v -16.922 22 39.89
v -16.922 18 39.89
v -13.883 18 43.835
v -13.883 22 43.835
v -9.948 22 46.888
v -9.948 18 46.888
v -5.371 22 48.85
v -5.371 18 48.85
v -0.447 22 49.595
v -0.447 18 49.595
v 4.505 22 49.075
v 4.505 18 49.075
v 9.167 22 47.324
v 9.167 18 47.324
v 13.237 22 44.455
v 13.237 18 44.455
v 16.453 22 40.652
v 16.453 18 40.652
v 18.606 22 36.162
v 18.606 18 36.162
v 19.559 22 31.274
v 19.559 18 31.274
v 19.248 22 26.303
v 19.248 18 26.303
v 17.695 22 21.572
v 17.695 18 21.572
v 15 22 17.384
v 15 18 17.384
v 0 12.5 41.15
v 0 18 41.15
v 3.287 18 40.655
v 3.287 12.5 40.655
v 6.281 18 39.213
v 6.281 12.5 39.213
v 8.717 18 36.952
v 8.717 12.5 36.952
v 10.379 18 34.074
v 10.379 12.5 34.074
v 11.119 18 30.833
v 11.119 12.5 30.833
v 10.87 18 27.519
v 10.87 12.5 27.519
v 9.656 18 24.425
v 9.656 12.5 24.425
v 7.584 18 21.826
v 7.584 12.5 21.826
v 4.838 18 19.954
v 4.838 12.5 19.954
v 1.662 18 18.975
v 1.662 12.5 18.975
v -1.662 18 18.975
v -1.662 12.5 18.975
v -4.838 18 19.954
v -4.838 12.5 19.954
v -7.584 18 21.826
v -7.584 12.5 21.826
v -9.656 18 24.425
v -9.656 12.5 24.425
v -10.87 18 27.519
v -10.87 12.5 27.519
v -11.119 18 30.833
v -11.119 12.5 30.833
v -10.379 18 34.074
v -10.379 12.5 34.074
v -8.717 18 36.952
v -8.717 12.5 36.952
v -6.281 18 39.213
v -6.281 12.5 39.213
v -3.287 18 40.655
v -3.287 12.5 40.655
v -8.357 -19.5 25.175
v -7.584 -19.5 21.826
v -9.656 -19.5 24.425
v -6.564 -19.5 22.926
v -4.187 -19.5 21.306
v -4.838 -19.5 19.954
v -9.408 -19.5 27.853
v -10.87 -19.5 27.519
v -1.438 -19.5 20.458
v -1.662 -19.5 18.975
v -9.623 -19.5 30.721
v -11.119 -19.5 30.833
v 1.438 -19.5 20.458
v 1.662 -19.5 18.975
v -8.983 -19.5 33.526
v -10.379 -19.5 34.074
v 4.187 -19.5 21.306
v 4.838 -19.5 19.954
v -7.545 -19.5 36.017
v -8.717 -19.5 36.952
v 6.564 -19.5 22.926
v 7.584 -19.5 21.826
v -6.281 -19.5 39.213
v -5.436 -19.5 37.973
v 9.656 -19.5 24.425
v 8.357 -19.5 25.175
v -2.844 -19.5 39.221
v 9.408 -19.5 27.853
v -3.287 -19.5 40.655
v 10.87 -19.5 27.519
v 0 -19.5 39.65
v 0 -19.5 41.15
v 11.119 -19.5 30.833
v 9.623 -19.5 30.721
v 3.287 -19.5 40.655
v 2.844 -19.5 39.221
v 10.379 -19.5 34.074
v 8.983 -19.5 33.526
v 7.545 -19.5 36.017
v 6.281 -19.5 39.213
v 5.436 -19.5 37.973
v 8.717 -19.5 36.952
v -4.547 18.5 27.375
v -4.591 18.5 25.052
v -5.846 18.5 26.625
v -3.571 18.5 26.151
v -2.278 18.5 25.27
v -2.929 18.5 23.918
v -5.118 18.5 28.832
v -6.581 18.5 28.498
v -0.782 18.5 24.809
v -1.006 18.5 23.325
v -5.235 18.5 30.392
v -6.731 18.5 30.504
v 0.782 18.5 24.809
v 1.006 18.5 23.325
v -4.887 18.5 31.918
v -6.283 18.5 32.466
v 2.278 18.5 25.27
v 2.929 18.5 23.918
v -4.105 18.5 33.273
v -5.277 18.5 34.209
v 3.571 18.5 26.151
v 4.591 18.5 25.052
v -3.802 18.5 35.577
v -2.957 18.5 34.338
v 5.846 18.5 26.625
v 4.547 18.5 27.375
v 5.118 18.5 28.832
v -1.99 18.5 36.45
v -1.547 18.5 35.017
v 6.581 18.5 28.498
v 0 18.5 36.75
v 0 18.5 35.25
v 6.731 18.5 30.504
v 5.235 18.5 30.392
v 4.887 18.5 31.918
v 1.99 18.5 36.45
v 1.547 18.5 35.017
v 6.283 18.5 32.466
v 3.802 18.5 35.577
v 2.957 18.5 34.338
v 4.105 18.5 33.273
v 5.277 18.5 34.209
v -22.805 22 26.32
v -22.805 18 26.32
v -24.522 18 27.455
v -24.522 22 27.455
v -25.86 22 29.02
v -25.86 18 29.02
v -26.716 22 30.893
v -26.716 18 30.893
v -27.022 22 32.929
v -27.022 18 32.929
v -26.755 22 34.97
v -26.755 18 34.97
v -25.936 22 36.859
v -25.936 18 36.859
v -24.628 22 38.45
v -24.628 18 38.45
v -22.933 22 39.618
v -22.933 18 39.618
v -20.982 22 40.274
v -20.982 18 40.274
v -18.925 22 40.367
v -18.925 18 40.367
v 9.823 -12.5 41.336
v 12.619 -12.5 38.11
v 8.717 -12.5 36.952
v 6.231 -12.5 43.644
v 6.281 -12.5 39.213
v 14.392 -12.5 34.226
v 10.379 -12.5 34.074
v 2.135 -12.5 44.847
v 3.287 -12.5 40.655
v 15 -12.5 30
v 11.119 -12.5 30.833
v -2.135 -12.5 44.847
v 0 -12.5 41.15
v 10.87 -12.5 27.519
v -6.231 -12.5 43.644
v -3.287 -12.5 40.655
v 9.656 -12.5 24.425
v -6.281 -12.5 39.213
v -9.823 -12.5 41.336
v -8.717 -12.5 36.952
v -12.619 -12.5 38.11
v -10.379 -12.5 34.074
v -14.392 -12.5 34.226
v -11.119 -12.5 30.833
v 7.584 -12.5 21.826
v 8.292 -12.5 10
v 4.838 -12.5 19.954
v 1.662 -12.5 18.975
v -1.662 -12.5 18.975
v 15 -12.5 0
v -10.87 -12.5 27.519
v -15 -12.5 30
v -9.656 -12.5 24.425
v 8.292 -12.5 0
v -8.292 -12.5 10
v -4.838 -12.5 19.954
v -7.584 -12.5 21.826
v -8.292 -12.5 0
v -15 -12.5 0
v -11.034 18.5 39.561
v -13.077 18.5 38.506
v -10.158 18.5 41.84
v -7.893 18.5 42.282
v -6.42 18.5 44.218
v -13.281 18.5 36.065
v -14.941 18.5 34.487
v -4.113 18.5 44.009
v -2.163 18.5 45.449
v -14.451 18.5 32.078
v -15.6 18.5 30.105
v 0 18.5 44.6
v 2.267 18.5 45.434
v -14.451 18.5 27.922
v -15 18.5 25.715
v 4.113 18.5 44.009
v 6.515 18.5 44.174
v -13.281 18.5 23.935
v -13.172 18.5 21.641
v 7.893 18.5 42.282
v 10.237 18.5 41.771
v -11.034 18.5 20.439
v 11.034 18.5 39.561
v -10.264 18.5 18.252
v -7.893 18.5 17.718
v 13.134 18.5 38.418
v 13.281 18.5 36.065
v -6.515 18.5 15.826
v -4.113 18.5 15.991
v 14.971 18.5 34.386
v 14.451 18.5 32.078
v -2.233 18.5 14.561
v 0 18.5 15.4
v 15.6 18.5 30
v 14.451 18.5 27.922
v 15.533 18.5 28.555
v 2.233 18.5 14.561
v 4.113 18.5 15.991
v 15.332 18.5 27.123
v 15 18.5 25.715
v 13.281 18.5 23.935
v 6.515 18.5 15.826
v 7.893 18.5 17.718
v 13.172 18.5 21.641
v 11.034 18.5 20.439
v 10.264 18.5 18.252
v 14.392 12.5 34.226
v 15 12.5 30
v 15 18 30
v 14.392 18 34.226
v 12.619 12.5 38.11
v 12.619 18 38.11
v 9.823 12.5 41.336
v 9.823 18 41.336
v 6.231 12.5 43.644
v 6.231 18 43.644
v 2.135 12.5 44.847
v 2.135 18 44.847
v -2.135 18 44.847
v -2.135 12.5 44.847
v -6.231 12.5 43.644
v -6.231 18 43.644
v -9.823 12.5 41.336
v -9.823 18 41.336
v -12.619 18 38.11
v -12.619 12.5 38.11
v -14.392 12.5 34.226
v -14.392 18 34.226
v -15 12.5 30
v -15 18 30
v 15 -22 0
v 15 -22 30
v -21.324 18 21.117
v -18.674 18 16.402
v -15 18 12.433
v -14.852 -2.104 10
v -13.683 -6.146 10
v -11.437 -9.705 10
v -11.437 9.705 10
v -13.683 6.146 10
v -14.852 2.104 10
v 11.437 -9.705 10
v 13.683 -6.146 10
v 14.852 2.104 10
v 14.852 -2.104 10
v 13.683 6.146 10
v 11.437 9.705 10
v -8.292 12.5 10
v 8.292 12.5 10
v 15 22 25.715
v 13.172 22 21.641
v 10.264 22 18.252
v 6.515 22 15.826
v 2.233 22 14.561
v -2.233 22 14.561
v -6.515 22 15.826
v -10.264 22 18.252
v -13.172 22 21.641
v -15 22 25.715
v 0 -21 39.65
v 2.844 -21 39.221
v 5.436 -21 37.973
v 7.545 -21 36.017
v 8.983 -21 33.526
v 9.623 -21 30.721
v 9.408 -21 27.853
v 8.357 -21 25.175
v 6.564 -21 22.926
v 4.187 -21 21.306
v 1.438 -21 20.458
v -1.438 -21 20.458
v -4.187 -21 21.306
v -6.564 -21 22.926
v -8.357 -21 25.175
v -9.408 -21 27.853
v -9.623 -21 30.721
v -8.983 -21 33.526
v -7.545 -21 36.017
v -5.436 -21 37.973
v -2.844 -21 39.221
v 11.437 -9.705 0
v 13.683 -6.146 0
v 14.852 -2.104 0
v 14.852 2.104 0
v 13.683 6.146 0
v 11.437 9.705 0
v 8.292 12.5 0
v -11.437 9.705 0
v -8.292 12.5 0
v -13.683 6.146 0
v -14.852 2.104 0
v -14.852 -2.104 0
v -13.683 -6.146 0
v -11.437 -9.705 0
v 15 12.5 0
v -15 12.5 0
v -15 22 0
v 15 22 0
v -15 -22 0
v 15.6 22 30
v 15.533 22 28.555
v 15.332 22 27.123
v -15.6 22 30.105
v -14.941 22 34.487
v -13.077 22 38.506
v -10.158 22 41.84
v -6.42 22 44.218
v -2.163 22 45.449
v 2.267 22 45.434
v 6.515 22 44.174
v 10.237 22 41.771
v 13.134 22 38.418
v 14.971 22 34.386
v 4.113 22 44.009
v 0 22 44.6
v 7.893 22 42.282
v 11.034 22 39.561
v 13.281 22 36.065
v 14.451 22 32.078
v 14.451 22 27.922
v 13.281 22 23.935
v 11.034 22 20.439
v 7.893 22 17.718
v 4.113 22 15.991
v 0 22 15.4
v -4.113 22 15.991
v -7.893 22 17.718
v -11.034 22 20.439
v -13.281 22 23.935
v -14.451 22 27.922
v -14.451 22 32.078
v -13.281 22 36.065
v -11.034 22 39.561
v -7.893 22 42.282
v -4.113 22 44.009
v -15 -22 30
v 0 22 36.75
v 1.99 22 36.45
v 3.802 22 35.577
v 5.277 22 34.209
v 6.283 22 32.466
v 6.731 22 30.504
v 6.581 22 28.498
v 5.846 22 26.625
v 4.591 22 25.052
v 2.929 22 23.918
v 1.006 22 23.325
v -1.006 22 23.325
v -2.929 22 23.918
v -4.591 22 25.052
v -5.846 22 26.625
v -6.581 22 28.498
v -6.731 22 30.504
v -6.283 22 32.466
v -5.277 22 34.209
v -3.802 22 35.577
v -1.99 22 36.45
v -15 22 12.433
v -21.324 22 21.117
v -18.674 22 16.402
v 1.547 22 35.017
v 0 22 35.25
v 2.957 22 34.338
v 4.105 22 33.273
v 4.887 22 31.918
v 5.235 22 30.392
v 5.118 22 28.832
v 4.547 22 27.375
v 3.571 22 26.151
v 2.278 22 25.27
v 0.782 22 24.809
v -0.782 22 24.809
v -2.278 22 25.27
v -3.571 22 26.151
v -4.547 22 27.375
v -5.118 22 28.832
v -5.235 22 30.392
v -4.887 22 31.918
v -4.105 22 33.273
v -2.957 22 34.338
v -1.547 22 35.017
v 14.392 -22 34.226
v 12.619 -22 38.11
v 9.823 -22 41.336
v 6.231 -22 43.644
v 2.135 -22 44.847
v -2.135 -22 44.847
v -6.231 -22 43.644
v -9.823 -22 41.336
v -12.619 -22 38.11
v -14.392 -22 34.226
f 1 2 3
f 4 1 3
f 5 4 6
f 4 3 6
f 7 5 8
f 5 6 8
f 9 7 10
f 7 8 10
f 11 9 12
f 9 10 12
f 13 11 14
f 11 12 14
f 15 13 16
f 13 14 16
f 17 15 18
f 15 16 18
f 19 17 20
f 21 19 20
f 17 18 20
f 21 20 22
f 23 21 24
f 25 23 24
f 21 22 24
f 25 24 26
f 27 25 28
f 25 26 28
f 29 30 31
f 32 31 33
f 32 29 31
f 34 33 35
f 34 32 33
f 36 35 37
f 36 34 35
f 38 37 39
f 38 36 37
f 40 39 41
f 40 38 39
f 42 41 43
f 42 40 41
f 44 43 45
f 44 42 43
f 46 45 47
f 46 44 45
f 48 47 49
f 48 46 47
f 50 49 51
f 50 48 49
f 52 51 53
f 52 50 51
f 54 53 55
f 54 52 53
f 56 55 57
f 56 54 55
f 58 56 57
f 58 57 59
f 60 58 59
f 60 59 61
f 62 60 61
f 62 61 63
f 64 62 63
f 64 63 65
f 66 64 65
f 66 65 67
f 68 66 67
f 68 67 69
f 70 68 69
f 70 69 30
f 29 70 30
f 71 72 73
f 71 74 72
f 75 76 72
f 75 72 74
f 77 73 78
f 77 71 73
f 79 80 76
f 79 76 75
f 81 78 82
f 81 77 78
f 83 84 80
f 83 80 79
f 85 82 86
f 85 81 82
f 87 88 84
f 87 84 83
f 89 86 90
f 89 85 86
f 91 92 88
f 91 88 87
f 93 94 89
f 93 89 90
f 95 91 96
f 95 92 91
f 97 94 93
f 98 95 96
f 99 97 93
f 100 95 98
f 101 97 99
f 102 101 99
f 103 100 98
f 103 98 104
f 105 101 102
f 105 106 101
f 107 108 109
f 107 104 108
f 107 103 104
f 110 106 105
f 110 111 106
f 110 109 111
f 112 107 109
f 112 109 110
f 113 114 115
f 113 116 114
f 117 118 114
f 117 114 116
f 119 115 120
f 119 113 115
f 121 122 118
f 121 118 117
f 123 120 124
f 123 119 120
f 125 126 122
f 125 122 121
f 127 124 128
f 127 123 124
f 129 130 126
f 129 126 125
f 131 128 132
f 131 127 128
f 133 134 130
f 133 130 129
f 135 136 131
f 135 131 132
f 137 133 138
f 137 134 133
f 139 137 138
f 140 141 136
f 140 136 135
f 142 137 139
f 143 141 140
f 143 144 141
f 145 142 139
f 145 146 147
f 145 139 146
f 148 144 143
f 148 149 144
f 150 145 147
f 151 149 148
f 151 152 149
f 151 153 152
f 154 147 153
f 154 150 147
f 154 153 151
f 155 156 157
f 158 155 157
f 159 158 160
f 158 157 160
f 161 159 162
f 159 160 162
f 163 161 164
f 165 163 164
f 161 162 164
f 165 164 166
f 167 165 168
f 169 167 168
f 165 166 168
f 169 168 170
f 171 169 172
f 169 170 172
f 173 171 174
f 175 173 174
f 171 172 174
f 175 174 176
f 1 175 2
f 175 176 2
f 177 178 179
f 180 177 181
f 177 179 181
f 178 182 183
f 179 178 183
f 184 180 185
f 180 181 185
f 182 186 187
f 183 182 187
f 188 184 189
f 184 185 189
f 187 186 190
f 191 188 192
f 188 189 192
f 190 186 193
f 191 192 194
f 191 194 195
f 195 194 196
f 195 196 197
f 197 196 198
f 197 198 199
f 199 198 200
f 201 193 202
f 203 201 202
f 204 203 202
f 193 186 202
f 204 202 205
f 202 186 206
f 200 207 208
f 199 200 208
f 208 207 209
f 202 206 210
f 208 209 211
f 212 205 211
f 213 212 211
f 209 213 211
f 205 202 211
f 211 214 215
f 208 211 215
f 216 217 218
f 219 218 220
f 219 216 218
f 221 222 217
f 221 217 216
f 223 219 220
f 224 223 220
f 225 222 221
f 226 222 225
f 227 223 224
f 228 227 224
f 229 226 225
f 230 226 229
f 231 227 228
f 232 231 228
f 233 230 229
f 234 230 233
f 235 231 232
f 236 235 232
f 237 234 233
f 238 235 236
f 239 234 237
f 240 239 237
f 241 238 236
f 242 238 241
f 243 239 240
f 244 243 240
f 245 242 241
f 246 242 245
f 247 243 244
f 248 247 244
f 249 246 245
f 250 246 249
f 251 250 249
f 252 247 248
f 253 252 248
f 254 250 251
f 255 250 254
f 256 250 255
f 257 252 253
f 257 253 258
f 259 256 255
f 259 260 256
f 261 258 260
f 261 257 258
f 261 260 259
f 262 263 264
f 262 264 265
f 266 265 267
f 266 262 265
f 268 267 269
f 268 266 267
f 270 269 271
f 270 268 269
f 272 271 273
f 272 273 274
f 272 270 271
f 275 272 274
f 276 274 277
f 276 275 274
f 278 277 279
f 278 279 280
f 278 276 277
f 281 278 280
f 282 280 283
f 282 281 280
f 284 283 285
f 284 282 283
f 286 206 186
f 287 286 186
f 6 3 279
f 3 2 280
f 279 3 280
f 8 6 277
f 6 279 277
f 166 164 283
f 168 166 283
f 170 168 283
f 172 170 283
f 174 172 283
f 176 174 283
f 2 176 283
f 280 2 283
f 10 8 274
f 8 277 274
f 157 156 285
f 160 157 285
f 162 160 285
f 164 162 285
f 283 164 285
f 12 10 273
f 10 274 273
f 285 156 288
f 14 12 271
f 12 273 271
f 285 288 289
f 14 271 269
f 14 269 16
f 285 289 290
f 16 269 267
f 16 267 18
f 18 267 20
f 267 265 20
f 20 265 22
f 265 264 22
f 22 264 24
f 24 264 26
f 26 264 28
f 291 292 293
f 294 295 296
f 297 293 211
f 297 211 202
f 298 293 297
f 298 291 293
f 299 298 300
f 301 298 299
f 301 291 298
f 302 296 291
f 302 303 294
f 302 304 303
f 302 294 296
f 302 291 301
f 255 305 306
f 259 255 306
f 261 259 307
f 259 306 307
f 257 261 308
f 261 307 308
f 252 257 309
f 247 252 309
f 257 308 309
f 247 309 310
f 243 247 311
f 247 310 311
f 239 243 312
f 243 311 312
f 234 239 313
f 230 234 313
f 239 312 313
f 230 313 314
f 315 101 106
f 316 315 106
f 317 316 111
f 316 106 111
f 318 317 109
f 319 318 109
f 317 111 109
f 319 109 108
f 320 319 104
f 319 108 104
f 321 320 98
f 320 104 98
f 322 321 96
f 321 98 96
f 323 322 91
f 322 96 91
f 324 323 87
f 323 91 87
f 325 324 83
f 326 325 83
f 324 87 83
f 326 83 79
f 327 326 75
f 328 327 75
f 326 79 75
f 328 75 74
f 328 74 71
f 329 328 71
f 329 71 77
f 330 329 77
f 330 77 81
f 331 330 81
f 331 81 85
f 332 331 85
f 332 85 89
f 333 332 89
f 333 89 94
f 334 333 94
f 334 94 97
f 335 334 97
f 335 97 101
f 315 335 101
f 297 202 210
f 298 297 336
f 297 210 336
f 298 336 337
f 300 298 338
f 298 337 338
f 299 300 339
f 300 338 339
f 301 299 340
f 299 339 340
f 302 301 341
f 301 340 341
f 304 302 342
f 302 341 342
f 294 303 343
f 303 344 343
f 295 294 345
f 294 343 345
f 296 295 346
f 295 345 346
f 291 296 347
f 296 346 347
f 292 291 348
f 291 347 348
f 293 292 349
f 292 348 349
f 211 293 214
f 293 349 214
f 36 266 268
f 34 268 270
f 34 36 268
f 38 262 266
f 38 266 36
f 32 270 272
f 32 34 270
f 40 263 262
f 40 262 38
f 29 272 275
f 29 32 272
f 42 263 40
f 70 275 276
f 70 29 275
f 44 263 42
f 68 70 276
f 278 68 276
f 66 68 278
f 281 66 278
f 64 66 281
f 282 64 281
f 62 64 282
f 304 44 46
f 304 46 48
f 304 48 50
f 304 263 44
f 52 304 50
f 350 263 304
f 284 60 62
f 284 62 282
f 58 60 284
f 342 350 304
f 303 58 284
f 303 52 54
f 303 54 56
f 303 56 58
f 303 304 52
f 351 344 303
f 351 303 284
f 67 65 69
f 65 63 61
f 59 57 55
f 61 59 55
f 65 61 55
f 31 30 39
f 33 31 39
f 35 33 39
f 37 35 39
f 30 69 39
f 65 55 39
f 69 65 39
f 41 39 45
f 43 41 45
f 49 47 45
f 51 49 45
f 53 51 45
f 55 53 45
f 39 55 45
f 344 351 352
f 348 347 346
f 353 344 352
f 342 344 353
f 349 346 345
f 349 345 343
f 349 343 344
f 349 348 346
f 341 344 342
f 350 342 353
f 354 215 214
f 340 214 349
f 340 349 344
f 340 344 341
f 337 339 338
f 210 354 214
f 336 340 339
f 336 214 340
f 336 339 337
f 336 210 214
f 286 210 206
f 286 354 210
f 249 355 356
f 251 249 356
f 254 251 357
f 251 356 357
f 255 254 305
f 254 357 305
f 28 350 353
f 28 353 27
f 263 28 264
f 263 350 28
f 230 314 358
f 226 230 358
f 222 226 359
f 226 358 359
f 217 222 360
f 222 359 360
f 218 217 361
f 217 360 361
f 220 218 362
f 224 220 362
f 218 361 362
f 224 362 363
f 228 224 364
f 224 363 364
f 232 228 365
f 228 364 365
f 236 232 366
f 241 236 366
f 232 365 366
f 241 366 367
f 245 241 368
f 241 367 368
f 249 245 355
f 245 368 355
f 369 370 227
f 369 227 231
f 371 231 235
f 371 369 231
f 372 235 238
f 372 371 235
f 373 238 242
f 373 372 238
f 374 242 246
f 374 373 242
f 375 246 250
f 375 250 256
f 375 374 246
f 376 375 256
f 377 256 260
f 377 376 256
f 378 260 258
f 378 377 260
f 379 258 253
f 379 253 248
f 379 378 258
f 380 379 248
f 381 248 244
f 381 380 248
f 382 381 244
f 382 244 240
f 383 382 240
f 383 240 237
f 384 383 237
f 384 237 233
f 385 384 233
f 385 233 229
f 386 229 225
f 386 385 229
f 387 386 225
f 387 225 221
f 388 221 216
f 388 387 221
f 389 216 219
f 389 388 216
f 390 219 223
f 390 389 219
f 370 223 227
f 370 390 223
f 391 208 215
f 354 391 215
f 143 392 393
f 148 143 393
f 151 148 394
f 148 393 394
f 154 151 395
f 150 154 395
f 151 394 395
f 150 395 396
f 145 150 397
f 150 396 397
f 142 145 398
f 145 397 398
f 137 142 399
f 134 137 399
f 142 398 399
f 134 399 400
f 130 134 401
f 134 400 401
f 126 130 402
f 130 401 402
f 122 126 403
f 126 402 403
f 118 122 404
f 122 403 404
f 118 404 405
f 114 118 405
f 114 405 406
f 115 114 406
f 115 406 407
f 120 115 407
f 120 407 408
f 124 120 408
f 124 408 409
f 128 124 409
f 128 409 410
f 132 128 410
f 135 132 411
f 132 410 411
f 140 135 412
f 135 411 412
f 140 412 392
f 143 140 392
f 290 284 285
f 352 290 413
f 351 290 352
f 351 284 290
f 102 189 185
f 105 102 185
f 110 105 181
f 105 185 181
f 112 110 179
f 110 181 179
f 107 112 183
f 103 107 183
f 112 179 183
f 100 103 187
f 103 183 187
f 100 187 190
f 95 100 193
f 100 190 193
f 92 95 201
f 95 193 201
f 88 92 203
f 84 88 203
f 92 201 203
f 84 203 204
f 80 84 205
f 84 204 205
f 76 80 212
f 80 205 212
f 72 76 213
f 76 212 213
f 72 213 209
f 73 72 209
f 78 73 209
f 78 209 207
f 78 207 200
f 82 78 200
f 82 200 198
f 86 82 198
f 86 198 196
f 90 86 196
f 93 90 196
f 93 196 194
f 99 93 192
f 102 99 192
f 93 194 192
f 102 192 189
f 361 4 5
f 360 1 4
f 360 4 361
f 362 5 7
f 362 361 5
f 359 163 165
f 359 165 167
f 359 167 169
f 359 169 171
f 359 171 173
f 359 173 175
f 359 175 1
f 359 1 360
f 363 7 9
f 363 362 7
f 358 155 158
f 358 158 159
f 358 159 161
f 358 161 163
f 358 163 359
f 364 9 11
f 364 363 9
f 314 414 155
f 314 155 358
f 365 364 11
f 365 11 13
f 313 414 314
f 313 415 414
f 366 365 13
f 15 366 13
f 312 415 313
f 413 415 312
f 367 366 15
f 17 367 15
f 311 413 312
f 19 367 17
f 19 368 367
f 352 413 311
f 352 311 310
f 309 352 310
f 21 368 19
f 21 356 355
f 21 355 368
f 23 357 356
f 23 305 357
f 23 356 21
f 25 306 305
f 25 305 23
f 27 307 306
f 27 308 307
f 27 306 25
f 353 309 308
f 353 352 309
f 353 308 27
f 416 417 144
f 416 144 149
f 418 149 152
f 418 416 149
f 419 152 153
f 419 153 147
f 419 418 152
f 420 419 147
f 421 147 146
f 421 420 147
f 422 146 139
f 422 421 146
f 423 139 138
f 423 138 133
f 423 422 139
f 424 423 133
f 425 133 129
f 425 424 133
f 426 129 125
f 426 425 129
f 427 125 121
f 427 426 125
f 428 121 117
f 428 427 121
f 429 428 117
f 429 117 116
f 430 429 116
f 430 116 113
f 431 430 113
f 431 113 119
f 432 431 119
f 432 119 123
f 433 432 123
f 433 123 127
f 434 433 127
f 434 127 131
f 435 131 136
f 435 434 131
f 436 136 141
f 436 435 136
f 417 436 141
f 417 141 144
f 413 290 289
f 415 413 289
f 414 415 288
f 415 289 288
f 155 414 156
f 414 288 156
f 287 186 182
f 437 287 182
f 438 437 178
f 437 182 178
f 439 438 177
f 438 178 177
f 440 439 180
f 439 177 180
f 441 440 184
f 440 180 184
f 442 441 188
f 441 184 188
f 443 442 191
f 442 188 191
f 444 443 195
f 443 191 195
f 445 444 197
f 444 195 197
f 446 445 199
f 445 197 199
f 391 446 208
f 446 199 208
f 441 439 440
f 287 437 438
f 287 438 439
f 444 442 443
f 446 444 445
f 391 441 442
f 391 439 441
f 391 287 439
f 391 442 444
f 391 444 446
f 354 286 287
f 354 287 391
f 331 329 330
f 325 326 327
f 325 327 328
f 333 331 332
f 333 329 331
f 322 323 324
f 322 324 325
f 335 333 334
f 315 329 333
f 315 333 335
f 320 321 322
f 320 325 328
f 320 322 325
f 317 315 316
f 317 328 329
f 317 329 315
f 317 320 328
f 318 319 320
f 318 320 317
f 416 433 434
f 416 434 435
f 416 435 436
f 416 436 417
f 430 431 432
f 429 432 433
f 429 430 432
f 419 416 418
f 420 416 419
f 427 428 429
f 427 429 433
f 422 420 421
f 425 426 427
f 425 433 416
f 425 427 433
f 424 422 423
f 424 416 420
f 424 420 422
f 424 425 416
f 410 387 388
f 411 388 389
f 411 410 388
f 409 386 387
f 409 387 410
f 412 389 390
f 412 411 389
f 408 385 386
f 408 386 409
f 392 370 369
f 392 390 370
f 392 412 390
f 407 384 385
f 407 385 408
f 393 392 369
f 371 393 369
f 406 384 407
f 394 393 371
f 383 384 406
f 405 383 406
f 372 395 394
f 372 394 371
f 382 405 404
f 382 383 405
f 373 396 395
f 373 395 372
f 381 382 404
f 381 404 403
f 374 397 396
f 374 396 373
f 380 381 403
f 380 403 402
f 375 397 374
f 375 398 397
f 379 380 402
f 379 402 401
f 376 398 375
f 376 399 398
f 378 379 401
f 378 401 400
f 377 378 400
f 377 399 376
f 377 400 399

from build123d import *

# Parameters (mm, degrees)
SKETCH_335_R           = 15
EXTRUDE_380_DEPTH      = 10
EXTRUDE_START          = -2.5
EXTRUDE_822_DEPTH      = 9.5
SKETCH_883_R           = 9.65
CUT_EXTRUDE_1089_DEPTH = 8.5
SKETCH_4_3_R           = 11.15
SKETCH_4_3_R_2         = 9.65
CUT_EXTRUDE_1131_DEPTH = 7
CUT_EXTRUDE_1399_REACH = 66.699
SKETCH_1242_R          = 3.6
EXTRUDE_3_DEPTH        = 4
SKETCH_4_5_R           = 15.6
SKETCH_4_5_R_2         = 14.6
SKETCH_4_5_R_3         = 6.75
SKETCH_4_5_R_4         = 5.25
CUT_EXTRUDE_1_DEPTH    = 3.5


with BuildPart() as part:
    # Sketch 335 → Extrude 380 (new body)
    with BuildSketch(Plane.XY):
        Circle(SKETCH_335_R)
    extrude(amount=EXTRUDE_380_DEPTH)

    # Эскиз2 → Extrude 822 (add)
    with BuildSketch(Plane(origin=(0, -15, 0), x_dir=(-1, 0, 0), z_dir=(0, -1, 0)).offset(EXTRUDE_START)):
        with BuildLine():
            Line((15, -30), (15, 0))
            Line((15, 0), (-15, 0))
            Line((-15, 0), (-15, -30))
            ThreePointArc((-15, -30), (0, -45), (15, -30))
        make_face()
    extrude_822 = extrude(amount=EXTRUDE_822_DEPTH)

    # Sketch 883 → Cut-Extrude 1089 (cut)
    with BuildSketch(Plane(origin=(0, -12.5, 0), x_dir=(1, 0, 0), z_dir=(0, 1, 0))):
        with Locations((0, -30)):
            Circle(SKETCH_883_R)
    cut_extrude_1089 = extrude(amount=-CUT_EXTRUDE_1089_DEPTH, mode=Mode.SUBTRACT)

    # Эскиз4<3> → Cut-Extrude 1131 (cut)
    with BuildSketch(Plane(origin=(0, -12.5, 0), x_dir=(1, 0, 0), z_dir=(0, 1, 0))):
        with Locations((0, -30)):
            Circle(SKETCH_4_3_R)
        with Locations((0, -30)):
            Circle(SKETCH_4_3_R_2, mode=Mode.SUBTRACT)
    cut_extrude_1131 = extrude(amount=-CUT_EXTRUDE_1131_DEPTH, mode=Mode.SUBTRACT)

    # Зеркальное отражение2: Extrude 822, Cut-Extrude 1089, Cut-Extrude 1131 across plane
    add(extrude_822.mirror(Plane.ZX))
    add(cut_extrude_1089.mirror(Plane.ZX), mode=Mode.SUBTRACT)
    add(cut_extrude_1131.mirror(Plane.ZX), mode=Mode.SUBTRACT)

    # Sketch 1242 → Cut-Extrude 1399 (cut, up to next)
    with BuildSketch(Plane(origin=(0, 22, 0), x_dir=(1, 0, 0), z_dir=(0, 1, 0)), mode=Mode.PRIVATE) as cut_extrude_1399_sk1:
        with Locations((0, -30)):
            Circle(SKETCH_1242_R)
    cut_extrude_1399_tool1 = extrude(cut_extrude_1399_sk1.sketch, amount=-CUT_EXTRUDE_1399_REACH, mode=Mode.PRIVATE) & part.part
    add(cut_extrude_1399_tool1.solids().sort_by_distance((0, 22, 30))[0], mode=Mode.SUBTRACT)

    # Эскиз4 → Бобышка-Вытянуть3 (add)
    with BuildSketch(Plane(origin=(0, 22, 0), x_dir=(1, 0, 0), z_dir=(0, 1, 0))):
        with BuildLine():
            ThreePointArc((-16.921921975, -39.889820861), (11.29379909, -46.019054345), (15, -17.38413697))
            Line((15, -17.38413697), (15, -25.715142943))
            ThreePointArc((15, -25.715142943), (0, -14.4), (-15, -25.715142943))
            Line((-15, -25.715142943), (-15, -12.432700834))
            ThreePointArc((-15, -12.432700834), (-20.137369493, -18.682034198), (-22.804910758, -26.319504748))
            ThreePointArc((-22.804910758, -26.319504748), (-26.411442066, -35.943355833), (-16.921921975, -39.889820861))
        make_face()
    extrude(amount=-EXTRUDE_3_DEPTH)

    # Эскиз4<5> → Вырез-Вытянуть1 (cut)
    # profile 1 of 2: a face of its own
    with BuildSketch(Plane(origin=(0, 22, 0), x_dir=(1, 0, 0), z_dir=(0, 1, 0))):
        with Locations((0, -30)):
            Circle(SKETCH_4_5_R)
        with Locations((0, -30)):
            Circle(SKETCH_4_5_R_2, mode=Mode.SUBTRACT)
    # profile 2 of 2: a face of its own
    with BuildSketch(Plane(origin=(0, 22, 0), x_dir=(1, 0, 0), z_dir=(0, 1, 0))):
        with Locations((0, -30)):
            Circle(SKETCH_4_5_R_3)
        with Locations((0, -30)):
            Circle(SKETCH_4_5_R_4, mode=Mode.SUBTRACT)
    extrude(amount=-CUT_EXTRUDE_1_DEPTH, mode=Mode.SUBTRACT)


solid = part.part
